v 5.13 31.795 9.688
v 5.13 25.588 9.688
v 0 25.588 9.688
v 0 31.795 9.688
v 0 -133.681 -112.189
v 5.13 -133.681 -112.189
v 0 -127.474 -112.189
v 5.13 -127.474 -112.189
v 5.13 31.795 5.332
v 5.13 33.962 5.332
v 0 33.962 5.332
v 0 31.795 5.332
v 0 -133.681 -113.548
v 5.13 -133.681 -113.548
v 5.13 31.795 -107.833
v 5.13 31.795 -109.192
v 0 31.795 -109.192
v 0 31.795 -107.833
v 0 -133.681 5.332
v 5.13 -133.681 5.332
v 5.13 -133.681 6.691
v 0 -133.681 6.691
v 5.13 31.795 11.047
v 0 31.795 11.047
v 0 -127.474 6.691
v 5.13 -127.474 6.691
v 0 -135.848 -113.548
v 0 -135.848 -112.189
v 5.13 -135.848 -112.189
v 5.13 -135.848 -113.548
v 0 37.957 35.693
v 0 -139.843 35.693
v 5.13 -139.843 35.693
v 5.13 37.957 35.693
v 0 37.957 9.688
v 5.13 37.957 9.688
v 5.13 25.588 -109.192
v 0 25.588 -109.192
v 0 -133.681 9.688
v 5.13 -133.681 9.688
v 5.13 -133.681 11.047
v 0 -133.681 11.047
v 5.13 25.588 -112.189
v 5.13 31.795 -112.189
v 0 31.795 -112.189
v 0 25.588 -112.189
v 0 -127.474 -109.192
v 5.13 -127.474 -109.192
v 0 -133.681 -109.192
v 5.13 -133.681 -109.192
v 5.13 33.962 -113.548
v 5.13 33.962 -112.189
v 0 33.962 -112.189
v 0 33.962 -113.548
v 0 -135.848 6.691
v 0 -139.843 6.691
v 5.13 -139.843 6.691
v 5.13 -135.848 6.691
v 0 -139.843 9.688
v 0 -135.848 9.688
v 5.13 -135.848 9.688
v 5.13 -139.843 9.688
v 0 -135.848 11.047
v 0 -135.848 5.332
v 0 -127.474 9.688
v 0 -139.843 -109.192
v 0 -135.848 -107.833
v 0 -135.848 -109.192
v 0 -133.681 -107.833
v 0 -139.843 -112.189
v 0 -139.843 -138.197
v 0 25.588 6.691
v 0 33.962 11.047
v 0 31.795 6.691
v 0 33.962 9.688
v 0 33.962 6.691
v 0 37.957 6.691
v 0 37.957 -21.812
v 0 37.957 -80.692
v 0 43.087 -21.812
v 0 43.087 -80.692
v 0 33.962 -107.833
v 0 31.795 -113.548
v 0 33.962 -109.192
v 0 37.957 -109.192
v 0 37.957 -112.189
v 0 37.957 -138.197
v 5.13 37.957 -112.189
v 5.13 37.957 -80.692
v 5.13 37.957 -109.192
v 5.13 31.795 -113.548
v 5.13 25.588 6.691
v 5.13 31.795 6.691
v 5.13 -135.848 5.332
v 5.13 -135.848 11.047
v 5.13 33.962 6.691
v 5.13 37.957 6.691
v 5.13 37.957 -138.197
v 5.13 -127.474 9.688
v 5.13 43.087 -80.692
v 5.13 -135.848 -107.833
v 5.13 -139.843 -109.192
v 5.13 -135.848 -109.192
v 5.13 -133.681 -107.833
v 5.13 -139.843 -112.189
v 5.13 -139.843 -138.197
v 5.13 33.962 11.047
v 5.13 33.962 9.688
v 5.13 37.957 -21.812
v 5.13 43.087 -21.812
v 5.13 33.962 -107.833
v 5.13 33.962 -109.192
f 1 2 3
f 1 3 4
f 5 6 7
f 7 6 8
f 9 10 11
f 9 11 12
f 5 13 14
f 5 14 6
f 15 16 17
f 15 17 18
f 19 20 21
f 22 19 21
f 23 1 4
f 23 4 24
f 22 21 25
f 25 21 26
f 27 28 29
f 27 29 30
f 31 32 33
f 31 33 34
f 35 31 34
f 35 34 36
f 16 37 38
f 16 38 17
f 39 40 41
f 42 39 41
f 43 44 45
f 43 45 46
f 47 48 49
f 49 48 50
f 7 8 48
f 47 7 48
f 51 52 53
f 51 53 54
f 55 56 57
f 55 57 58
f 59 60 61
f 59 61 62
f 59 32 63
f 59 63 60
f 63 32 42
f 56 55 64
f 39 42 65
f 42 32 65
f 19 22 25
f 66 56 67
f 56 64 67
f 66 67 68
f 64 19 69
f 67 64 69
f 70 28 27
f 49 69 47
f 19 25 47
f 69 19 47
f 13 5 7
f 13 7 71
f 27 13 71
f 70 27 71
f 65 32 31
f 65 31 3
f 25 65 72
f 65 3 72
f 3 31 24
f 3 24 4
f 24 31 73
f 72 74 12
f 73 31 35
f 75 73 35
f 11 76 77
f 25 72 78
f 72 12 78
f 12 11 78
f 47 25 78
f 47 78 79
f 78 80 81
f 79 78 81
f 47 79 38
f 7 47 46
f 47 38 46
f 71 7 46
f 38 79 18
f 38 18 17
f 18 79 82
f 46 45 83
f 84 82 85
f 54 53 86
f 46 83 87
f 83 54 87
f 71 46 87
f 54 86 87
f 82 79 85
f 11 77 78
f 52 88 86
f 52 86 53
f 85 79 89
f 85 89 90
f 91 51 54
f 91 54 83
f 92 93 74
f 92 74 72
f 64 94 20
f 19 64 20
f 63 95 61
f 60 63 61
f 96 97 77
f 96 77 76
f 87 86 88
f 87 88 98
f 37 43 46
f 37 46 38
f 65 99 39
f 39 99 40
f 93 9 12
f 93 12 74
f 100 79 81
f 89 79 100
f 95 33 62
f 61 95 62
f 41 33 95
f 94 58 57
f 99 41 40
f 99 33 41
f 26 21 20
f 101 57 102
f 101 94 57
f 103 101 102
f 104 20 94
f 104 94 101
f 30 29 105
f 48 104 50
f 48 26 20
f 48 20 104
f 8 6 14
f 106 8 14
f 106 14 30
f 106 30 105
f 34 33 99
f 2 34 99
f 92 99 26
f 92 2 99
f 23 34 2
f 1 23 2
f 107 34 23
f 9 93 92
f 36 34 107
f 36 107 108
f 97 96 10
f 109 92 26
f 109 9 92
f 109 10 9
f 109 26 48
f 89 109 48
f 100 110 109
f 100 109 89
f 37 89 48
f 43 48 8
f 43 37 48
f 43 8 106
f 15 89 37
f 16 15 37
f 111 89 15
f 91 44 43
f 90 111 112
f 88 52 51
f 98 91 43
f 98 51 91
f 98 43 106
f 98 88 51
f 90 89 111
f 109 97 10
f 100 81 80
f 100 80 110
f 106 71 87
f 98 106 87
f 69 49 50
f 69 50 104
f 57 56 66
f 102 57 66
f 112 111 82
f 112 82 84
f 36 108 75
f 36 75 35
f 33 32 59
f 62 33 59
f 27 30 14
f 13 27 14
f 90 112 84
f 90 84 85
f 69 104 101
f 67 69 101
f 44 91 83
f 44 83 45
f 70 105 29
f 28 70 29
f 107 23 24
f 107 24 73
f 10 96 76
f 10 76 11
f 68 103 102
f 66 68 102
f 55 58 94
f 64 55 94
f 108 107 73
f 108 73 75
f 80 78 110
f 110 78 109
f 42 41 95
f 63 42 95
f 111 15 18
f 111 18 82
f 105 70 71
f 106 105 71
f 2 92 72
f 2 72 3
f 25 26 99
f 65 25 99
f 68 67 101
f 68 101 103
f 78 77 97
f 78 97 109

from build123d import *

# Parameters (mm, degrees)
SKETCH1_W            = 173.89
SKETCH1_H            = 177.8
MAIN_DEPTH           = 5.13
T_SLOT_DEPTH         = 5.13
LPATTERN2_COUNT      = 2
LPATTERN2_PITCH      = 118.88
MIRROR1_COPY_1_DEPTH = 5.13
SKETCH6_W            = 5.13
SKETCH6_H            = 58.88
TOOTH_DEPTH          = 5.13


with BuildPart() as part:
    # Sketch1 → Main (new body)
    with BuildSketch(Plane(origin=(0, 0, 0), x_dir=(0, 0, -1), z_dir=(1, 0, 0))):
        with Locations((51.252197546, -50.943101868)):
            Rectangle(SKETCH1_W, SKETCH1_H)
    extrude(amount=MAIN_DEPTH)

    # Sketch2 → t-slot (cut)
    with BuildSketch(Plane(origin=(5.13, 0, 0), x_dir=(0, 0, -1), z_dir=(1, 0, 0))):
        Polygon((-9.687802454, 37.956898132), (-6.690802454, 37.956898132), (-6.690802454, 33.961898132), (-5.331802454, 33.961898132), (-5.331802454, 31.794898132), (-6.690802454, 31.794898132), (-6.690802454, 25.587898132), (-9.687802454, 25.587898132), (-9.687802454, 31.794898132), (-11.046802454, 31.794898132), (-11.046802454, 33.961898132), (-9.687802454, 33.961898132), align=None)
    t_slot = extrude(amount=-T_SLOT_DEPTH, mode=Mode.SUBTRACT)

    # LPattern2: t-slot ×2
    with Locations(*[(0, 0, -i * LPATTERN2_PITCH) for i in range(1, LPATTERN2_COUNT)]):
        add(t_slot, mode=Mode.SUBTRACT)

    # Mirror1: t-slot across plane
    add(t_slot.mirror(Plane(origin=(0, -50.943101868, 0), x_dir=(0, 0, 1), z_dir=(0, -1, 0))), mode=Mode.SUBTRACT)

    # Mirror1 copy 1 sketch → Mirror1 copy 1 (cut)
    with BuildSketch(Plane(origin=(5.13, -101.886203737, -118.88), x_dir=(0, 0, -1), z_dir=(1, 0, 0))):
        Polygon((-9.687802454, -37.956898132), (-6.690802454, -37.956898132), (-6.690802454, -33.961898132), (-5.331802454, -33.961898132), (-5.331802454, -31.794898132), (-6.690802454, -31.794898132), (-6.690802454, -25.587898132), (-9.687802454, -25.587898132), (-9.687802454, -31.794898132), (-11.046802454, -31.794898132), (-11.046802454, -33.961898132), (-9.687802454, -33.961898132), align=None)
    extrude(amount=-MIRROR1_COPY_1_DEPTH, mode=Mode.SUBTRACT)

    # Sketch6 → Tooth (add)
    with BuildSketch(Plane(origin=(0, 37.956898132, 0), x_dir=(1, 0, 0), z_dir=(0, 1, 0))):
        with Locations((2.565, 51.252197546)):
            Rectangle(SKETCH6_W, SKETCH6_H)
    extrude(amount=TOOTH_DEPTH)


solid = part.part
